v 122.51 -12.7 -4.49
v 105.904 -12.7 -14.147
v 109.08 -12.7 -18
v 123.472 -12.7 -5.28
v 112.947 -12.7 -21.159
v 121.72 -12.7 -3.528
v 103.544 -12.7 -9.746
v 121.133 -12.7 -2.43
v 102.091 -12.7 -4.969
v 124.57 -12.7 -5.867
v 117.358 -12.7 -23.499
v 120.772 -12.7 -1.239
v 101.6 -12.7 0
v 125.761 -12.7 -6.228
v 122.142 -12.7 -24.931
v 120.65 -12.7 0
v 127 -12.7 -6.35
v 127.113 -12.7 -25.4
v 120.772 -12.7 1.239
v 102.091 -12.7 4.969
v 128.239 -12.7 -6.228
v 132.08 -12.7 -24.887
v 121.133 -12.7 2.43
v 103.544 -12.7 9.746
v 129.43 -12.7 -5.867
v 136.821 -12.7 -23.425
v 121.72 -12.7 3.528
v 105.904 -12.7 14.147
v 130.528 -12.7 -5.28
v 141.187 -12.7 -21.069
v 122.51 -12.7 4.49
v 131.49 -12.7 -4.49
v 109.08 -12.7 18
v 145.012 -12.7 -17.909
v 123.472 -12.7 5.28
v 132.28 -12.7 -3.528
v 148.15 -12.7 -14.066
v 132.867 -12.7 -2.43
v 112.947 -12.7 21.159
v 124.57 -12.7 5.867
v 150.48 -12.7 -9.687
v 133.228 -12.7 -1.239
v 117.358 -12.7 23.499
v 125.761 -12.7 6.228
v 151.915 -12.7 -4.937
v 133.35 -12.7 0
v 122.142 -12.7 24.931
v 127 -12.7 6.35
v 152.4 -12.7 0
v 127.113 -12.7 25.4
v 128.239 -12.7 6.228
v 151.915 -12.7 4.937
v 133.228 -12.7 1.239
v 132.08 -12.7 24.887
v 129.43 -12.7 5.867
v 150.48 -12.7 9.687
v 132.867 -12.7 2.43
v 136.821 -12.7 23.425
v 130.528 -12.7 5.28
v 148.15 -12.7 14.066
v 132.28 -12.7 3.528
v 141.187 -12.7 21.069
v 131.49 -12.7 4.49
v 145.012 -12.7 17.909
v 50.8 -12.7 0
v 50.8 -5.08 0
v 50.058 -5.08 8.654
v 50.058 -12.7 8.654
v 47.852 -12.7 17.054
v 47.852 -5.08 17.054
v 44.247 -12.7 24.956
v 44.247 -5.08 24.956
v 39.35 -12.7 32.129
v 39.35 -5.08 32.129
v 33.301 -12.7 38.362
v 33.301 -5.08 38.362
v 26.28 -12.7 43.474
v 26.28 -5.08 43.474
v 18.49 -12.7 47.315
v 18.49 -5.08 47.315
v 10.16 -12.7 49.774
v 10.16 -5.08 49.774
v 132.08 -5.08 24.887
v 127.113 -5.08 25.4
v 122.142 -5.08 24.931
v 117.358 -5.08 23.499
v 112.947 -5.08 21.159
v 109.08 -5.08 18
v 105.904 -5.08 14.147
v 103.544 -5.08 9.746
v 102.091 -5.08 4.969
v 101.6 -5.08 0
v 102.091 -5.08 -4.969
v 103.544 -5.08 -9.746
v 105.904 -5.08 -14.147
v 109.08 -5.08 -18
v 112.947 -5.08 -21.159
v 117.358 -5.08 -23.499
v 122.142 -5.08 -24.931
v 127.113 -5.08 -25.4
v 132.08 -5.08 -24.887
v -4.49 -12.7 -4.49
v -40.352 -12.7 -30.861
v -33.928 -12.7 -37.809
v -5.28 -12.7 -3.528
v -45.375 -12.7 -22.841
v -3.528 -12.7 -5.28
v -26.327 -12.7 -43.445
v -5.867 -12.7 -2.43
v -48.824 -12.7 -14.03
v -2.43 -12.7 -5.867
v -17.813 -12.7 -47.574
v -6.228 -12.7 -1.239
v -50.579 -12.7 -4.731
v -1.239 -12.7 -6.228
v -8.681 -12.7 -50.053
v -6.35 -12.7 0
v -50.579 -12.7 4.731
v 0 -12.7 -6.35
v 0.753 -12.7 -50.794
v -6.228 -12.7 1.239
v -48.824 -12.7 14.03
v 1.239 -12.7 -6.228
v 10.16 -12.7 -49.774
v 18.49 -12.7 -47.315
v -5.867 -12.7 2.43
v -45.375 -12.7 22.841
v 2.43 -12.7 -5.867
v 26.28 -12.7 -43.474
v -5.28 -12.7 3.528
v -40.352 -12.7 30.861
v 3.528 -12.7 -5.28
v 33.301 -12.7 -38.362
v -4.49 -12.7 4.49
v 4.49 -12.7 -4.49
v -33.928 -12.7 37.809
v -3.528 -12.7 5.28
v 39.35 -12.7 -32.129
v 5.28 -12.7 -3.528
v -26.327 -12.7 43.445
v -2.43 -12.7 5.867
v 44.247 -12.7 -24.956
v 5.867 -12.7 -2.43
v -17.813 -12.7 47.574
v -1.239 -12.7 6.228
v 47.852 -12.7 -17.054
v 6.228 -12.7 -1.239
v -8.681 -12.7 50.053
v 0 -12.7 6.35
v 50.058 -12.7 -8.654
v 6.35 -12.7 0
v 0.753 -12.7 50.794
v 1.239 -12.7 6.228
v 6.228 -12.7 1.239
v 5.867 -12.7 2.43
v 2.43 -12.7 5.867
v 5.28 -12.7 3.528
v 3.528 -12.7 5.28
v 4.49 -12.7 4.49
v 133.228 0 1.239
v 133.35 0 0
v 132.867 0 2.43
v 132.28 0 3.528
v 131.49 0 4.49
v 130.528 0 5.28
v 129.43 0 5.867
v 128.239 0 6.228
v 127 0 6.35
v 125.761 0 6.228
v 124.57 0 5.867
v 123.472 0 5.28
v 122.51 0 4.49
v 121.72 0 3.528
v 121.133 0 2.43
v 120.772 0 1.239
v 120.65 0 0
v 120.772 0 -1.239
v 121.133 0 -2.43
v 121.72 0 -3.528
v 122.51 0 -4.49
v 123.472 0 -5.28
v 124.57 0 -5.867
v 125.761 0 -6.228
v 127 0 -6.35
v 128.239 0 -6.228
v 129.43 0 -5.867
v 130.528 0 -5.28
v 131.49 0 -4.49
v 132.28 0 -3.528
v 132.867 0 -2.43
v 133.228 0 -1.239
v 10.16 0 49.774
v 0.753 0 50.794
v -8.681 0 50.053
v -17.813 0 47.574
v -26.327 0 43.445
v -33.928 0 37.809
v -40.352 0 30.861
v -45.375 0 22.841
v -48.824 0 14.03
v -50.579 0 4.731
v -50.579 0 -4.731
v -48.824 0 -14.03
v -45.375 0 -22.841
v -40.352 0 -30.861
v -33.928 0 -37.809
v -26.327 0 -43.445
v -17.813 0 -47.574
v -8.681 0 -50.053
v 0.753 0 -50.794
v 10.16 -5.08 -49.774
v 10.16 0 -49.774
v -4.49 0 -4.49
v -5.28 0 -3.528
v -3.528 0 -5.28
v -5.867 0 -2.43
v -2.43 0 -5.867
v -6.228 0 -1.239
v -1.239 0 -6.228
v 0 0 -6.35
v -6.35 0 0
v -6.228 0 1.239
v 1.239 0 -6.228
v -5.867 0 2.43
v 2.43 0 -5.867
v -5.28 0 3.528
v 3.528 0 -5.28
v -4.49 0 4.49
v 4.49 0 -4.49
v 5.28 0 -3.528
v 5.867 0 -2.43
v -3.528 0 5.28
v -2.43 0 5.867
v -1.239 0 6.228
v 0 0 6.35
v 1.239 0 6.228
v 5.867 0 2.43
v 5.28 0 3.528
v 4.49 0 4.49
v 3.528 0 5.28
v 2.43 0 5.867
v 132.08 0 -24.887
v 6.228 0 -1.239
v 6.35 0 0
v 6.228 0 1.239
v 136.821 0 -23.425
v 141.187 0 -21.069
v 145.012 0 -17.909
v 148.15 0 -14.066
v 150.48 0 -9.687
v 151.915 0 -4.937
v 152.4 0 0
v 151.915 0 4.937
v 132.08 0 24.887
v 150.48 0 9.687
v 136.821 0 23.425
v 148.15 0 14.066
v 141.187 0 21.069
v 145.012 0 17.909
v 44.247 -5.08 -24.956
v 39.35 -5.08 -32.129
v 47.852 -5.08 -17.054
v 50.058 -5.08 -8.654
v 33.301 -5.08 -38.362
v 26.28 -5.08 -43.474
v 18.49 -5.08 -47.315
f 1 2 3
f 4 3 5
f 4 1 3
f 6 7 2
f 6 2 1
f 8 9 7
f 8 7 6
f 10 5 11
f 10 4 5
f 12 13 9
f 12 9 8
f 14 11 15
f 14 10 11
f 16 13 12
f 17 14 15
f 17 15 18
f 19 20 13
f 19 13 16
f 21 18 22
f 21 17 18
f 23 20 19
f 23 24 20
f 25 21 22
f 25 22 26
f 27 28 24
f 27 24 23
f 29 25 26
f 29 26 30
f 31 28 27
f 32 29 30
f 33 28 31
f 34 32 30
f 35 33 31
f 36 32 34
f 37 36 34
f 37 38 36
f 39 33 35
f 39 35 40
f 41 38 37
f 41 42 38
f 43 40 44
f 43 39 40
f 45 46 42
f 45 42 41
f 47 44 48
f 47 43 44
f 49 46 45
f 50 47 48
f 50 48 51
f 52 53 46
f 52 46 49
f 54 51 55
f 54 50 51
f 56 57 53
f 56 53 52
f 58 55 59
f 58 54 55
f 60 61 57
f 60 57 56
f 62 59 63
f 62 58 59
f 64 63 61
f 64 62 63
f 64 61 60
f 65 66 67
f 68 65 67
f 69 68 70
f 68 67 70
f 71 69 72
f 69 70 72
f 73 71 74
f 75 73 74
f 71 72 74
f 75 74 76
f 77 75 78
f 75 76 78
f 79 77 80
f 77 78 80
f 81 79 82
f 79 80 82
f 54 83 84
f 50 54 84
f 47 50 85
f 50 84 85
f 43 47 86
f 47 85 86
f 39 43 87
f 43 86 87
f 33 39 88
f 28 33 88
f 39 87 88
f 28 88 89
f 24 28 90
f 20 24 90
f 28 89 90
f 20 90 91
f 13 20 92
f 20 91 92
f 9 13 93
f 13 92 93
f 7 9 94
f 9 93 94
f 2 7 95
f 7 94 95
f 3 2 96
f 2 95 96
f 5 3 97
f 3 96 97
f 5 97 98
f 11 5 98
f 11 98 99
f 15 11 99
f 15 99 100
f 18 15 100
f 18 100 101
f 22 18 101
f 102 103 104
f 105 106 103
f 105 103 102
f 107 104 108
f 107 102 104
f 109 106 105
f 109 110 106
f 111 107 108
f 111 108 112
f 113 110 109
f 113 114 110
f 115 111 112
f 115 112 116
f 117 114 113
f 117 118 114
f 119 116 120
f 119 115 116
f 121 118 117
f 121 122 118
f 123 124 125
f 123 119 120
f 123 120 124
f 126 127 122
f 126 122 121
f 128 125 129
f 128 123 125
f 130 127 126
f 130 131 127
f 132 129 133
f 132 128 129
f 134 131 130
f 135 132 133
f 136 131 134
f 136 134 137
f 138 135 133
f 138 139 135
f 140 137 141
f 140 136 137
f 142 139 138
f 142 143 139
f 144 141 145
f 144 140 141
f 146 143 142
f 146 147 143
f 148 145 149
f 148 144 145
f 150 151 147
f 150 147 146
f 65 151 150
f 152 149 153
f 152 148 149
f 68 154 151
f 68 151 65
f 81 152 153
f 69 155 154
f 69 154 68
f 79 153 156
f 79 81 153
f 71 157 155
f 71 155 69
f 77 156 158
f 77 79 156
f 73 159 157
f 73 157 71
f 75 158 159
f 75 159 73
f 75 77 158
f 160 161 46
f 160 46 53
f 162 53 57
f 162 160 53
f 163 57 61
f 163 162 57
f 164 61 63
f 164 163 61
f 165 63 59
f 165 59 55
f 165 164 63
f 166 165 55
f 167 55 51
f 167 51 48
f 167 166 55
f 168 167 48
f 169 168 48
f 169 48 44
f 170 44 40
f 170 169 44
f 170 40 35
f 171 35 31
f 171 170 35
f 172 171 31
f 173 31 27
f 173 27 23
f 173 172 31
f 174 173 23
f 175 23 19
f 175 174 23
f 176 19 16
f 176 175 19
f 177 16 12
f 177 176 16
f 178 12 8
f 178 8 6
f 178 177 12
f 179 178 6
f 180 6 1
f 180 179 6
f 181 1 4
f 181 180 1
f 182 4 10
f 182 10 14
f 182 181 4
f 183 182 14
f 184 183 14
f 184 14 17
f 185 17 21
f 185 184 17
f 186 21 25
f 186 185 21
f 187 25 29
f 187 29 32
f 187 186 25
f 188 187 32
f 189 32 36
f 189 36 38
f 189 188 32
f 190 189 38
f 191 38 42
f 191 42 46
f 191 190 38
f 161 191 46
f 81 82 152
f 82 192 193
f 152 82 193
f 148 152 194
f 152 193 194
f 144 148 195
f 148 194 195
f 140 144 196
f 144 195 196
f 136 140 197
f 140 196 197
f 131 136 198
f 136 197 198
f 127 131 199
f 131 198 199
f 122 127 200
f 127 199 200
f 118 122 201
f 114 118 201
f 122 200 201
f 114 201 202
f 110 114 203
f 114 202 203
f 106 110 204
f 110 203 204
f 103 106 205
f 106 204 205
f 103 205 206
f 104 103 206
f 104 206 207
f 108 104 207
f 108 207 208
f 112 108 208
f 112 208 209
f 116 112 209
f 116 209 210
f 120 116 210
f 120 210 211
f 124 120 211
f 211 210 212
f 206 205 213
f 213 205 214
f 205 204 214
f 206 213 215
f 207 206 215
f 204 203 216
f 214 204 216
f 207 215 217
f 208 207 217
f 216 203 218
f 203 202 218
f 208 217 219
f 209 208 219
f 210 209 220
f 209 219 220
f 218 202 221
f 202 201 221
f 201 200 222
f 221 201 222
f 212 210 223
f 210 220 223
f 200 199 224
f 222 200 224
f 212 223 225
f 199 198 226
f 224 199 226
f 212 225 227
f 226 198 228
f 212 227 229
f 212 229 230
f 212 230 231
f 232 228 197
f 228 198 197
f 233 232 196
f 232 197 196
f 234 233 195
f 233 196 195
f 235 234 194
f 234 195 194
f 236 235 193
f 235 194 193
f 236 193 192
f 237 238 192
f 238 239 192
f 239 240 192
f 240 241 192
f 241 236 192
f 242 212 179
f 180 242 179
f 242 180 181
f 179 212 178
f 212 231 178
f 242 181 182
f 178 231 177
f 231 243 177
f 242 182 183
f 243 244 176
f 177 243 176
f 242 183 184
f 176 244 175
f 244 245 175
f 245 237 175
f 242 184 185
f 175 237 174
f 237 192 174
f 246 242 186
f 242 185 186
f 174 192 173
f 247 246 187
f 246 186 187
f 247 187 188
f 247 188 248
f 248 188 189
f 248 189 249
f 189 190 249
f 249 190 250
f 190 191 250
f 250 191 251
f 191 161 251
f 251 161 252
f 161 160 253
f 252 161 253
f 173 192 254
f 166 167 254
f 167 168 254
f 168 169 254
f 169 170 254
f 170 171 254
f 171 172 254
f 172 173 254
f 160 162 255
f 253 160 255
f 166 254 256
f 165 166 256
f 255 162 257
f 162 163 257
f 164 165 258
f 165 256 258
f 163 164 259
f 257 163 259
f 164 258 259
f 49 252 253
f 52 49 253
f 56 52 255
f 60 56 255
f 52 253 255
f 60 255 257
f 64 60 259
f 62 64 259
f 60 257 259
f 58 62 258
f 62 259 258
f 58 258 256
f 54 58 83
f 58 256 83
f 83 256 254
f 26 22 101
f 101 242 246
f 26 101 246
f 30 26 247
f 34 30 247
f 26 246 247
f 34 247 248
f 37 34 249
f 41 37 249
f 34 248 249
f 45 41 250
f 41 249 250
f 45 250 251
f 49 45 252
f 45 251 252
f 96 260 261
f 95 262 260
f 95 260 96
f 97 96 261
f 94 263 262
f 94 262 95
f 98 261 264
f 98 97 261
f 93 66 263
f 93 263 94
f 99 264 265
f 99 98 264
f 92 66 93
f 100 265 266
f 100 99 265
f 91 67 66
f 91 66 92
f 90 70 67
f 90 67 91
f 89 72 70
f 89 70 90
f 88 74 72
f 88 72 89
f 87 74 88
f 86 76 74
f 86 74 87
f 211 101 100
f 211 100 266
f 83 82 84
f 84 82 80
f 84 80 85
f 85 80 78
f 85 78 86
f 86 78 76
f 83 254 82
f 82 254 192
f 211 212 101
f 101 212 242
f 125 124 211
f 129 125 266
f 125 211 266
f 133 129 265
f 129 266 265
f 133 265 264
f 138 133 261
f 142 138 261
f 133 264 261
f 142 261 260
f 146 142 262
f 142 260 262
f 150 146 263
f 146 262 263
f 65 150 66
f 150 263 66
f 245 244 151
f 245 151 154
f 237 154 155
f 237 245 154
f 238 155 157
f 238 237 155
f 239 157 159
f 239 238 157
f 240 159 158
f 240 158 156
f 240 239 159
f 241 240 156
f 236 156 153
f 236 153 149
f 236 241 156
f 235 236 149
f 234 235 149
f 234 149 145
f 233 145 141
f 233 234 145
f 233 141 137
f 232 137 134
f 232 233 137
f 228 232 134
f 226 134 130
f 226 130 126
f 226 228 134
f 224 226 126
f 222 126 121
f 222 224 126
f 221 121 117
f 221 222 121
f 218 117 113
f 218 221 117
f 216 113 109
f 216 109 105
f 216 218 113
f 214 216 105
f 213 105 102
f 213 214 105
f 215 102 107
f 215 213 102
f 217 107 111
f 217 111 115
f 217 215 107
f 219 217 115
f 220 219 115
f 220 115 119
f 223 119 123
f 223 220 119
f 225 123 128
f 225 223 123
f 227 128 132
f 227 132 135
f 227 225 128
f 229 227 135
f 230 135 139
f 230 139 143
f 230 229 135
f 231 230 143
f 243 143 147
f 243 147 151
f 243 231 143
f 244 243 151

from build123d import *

# Parameters (mm, degrees)
F0_R     = 6.35
F1_DEPTH = 12.7
F2_DEPTH = 5.08
F3_DEPTH = 101.6


with BuildPart() as f1:
    # F0 (on Front) → F1 (new body)
    with BuildSketch(Plane.XZ):
        with BuildLine():
            ThreePointArc((152.4, 0), (146.674755, 16.064371), (132.08, 24.886816))
            ThreePointArc((132.08, 24.886816), (101.6, 0), (132.08, -24.886816))
            ThreePointArc((132.08, -24.886816), (146.674755, -16.064371), (152.4, 0))
        make_face()
        with Locations((127, 0)):
            Circle(F0_R, mode=Mode.SUBTRACT)
        with BuildLine():
            ThreePointArc((10.16, -49.773632), (39.349511, -32.128741), (50.8, 0))
            ThreePointArc((50.8, 0), (39.349511, 32.128741), (10.16, 49.773632))
            ThreePointArc((10.16, 49.773632), (-50.8, 0), (10.16, -49.773632))
        make_face()
        Circle(F0_R, mode=Mode.SUBTRACT)
    extrude(amount=F1_DEPTH)

    # F0 (on Front) → F2 (join)
    with BuildSketch(Plane.XZ):
        with BuildLine():
            ThreePointArc((10.16, 49.773632), (39.349511, 32.128741), (50.8, 0))
            ThreePointArc((50.8, 0), (39.349511, -32.128741), (10.16, -49.773632))
            Line((10.16, -49.773632), (132.08, -24.886816))
            ThreePointArc((132.08, -24.886816), (101.6, 0), (132.08, 24.886816))
            Line((132.08, 24.886816), (10.16, 49.773632))
        make_face()
    extrude(amount=F2_DEPTH)

    # F0 (on Front) → F3 (cut)
    with BuildSketch(Plane.XZ):
        Circle(F0_R)
    extrude(amount=F3_DEPTH, mode=Mode.SUBTRACT)


solid = f1.part
